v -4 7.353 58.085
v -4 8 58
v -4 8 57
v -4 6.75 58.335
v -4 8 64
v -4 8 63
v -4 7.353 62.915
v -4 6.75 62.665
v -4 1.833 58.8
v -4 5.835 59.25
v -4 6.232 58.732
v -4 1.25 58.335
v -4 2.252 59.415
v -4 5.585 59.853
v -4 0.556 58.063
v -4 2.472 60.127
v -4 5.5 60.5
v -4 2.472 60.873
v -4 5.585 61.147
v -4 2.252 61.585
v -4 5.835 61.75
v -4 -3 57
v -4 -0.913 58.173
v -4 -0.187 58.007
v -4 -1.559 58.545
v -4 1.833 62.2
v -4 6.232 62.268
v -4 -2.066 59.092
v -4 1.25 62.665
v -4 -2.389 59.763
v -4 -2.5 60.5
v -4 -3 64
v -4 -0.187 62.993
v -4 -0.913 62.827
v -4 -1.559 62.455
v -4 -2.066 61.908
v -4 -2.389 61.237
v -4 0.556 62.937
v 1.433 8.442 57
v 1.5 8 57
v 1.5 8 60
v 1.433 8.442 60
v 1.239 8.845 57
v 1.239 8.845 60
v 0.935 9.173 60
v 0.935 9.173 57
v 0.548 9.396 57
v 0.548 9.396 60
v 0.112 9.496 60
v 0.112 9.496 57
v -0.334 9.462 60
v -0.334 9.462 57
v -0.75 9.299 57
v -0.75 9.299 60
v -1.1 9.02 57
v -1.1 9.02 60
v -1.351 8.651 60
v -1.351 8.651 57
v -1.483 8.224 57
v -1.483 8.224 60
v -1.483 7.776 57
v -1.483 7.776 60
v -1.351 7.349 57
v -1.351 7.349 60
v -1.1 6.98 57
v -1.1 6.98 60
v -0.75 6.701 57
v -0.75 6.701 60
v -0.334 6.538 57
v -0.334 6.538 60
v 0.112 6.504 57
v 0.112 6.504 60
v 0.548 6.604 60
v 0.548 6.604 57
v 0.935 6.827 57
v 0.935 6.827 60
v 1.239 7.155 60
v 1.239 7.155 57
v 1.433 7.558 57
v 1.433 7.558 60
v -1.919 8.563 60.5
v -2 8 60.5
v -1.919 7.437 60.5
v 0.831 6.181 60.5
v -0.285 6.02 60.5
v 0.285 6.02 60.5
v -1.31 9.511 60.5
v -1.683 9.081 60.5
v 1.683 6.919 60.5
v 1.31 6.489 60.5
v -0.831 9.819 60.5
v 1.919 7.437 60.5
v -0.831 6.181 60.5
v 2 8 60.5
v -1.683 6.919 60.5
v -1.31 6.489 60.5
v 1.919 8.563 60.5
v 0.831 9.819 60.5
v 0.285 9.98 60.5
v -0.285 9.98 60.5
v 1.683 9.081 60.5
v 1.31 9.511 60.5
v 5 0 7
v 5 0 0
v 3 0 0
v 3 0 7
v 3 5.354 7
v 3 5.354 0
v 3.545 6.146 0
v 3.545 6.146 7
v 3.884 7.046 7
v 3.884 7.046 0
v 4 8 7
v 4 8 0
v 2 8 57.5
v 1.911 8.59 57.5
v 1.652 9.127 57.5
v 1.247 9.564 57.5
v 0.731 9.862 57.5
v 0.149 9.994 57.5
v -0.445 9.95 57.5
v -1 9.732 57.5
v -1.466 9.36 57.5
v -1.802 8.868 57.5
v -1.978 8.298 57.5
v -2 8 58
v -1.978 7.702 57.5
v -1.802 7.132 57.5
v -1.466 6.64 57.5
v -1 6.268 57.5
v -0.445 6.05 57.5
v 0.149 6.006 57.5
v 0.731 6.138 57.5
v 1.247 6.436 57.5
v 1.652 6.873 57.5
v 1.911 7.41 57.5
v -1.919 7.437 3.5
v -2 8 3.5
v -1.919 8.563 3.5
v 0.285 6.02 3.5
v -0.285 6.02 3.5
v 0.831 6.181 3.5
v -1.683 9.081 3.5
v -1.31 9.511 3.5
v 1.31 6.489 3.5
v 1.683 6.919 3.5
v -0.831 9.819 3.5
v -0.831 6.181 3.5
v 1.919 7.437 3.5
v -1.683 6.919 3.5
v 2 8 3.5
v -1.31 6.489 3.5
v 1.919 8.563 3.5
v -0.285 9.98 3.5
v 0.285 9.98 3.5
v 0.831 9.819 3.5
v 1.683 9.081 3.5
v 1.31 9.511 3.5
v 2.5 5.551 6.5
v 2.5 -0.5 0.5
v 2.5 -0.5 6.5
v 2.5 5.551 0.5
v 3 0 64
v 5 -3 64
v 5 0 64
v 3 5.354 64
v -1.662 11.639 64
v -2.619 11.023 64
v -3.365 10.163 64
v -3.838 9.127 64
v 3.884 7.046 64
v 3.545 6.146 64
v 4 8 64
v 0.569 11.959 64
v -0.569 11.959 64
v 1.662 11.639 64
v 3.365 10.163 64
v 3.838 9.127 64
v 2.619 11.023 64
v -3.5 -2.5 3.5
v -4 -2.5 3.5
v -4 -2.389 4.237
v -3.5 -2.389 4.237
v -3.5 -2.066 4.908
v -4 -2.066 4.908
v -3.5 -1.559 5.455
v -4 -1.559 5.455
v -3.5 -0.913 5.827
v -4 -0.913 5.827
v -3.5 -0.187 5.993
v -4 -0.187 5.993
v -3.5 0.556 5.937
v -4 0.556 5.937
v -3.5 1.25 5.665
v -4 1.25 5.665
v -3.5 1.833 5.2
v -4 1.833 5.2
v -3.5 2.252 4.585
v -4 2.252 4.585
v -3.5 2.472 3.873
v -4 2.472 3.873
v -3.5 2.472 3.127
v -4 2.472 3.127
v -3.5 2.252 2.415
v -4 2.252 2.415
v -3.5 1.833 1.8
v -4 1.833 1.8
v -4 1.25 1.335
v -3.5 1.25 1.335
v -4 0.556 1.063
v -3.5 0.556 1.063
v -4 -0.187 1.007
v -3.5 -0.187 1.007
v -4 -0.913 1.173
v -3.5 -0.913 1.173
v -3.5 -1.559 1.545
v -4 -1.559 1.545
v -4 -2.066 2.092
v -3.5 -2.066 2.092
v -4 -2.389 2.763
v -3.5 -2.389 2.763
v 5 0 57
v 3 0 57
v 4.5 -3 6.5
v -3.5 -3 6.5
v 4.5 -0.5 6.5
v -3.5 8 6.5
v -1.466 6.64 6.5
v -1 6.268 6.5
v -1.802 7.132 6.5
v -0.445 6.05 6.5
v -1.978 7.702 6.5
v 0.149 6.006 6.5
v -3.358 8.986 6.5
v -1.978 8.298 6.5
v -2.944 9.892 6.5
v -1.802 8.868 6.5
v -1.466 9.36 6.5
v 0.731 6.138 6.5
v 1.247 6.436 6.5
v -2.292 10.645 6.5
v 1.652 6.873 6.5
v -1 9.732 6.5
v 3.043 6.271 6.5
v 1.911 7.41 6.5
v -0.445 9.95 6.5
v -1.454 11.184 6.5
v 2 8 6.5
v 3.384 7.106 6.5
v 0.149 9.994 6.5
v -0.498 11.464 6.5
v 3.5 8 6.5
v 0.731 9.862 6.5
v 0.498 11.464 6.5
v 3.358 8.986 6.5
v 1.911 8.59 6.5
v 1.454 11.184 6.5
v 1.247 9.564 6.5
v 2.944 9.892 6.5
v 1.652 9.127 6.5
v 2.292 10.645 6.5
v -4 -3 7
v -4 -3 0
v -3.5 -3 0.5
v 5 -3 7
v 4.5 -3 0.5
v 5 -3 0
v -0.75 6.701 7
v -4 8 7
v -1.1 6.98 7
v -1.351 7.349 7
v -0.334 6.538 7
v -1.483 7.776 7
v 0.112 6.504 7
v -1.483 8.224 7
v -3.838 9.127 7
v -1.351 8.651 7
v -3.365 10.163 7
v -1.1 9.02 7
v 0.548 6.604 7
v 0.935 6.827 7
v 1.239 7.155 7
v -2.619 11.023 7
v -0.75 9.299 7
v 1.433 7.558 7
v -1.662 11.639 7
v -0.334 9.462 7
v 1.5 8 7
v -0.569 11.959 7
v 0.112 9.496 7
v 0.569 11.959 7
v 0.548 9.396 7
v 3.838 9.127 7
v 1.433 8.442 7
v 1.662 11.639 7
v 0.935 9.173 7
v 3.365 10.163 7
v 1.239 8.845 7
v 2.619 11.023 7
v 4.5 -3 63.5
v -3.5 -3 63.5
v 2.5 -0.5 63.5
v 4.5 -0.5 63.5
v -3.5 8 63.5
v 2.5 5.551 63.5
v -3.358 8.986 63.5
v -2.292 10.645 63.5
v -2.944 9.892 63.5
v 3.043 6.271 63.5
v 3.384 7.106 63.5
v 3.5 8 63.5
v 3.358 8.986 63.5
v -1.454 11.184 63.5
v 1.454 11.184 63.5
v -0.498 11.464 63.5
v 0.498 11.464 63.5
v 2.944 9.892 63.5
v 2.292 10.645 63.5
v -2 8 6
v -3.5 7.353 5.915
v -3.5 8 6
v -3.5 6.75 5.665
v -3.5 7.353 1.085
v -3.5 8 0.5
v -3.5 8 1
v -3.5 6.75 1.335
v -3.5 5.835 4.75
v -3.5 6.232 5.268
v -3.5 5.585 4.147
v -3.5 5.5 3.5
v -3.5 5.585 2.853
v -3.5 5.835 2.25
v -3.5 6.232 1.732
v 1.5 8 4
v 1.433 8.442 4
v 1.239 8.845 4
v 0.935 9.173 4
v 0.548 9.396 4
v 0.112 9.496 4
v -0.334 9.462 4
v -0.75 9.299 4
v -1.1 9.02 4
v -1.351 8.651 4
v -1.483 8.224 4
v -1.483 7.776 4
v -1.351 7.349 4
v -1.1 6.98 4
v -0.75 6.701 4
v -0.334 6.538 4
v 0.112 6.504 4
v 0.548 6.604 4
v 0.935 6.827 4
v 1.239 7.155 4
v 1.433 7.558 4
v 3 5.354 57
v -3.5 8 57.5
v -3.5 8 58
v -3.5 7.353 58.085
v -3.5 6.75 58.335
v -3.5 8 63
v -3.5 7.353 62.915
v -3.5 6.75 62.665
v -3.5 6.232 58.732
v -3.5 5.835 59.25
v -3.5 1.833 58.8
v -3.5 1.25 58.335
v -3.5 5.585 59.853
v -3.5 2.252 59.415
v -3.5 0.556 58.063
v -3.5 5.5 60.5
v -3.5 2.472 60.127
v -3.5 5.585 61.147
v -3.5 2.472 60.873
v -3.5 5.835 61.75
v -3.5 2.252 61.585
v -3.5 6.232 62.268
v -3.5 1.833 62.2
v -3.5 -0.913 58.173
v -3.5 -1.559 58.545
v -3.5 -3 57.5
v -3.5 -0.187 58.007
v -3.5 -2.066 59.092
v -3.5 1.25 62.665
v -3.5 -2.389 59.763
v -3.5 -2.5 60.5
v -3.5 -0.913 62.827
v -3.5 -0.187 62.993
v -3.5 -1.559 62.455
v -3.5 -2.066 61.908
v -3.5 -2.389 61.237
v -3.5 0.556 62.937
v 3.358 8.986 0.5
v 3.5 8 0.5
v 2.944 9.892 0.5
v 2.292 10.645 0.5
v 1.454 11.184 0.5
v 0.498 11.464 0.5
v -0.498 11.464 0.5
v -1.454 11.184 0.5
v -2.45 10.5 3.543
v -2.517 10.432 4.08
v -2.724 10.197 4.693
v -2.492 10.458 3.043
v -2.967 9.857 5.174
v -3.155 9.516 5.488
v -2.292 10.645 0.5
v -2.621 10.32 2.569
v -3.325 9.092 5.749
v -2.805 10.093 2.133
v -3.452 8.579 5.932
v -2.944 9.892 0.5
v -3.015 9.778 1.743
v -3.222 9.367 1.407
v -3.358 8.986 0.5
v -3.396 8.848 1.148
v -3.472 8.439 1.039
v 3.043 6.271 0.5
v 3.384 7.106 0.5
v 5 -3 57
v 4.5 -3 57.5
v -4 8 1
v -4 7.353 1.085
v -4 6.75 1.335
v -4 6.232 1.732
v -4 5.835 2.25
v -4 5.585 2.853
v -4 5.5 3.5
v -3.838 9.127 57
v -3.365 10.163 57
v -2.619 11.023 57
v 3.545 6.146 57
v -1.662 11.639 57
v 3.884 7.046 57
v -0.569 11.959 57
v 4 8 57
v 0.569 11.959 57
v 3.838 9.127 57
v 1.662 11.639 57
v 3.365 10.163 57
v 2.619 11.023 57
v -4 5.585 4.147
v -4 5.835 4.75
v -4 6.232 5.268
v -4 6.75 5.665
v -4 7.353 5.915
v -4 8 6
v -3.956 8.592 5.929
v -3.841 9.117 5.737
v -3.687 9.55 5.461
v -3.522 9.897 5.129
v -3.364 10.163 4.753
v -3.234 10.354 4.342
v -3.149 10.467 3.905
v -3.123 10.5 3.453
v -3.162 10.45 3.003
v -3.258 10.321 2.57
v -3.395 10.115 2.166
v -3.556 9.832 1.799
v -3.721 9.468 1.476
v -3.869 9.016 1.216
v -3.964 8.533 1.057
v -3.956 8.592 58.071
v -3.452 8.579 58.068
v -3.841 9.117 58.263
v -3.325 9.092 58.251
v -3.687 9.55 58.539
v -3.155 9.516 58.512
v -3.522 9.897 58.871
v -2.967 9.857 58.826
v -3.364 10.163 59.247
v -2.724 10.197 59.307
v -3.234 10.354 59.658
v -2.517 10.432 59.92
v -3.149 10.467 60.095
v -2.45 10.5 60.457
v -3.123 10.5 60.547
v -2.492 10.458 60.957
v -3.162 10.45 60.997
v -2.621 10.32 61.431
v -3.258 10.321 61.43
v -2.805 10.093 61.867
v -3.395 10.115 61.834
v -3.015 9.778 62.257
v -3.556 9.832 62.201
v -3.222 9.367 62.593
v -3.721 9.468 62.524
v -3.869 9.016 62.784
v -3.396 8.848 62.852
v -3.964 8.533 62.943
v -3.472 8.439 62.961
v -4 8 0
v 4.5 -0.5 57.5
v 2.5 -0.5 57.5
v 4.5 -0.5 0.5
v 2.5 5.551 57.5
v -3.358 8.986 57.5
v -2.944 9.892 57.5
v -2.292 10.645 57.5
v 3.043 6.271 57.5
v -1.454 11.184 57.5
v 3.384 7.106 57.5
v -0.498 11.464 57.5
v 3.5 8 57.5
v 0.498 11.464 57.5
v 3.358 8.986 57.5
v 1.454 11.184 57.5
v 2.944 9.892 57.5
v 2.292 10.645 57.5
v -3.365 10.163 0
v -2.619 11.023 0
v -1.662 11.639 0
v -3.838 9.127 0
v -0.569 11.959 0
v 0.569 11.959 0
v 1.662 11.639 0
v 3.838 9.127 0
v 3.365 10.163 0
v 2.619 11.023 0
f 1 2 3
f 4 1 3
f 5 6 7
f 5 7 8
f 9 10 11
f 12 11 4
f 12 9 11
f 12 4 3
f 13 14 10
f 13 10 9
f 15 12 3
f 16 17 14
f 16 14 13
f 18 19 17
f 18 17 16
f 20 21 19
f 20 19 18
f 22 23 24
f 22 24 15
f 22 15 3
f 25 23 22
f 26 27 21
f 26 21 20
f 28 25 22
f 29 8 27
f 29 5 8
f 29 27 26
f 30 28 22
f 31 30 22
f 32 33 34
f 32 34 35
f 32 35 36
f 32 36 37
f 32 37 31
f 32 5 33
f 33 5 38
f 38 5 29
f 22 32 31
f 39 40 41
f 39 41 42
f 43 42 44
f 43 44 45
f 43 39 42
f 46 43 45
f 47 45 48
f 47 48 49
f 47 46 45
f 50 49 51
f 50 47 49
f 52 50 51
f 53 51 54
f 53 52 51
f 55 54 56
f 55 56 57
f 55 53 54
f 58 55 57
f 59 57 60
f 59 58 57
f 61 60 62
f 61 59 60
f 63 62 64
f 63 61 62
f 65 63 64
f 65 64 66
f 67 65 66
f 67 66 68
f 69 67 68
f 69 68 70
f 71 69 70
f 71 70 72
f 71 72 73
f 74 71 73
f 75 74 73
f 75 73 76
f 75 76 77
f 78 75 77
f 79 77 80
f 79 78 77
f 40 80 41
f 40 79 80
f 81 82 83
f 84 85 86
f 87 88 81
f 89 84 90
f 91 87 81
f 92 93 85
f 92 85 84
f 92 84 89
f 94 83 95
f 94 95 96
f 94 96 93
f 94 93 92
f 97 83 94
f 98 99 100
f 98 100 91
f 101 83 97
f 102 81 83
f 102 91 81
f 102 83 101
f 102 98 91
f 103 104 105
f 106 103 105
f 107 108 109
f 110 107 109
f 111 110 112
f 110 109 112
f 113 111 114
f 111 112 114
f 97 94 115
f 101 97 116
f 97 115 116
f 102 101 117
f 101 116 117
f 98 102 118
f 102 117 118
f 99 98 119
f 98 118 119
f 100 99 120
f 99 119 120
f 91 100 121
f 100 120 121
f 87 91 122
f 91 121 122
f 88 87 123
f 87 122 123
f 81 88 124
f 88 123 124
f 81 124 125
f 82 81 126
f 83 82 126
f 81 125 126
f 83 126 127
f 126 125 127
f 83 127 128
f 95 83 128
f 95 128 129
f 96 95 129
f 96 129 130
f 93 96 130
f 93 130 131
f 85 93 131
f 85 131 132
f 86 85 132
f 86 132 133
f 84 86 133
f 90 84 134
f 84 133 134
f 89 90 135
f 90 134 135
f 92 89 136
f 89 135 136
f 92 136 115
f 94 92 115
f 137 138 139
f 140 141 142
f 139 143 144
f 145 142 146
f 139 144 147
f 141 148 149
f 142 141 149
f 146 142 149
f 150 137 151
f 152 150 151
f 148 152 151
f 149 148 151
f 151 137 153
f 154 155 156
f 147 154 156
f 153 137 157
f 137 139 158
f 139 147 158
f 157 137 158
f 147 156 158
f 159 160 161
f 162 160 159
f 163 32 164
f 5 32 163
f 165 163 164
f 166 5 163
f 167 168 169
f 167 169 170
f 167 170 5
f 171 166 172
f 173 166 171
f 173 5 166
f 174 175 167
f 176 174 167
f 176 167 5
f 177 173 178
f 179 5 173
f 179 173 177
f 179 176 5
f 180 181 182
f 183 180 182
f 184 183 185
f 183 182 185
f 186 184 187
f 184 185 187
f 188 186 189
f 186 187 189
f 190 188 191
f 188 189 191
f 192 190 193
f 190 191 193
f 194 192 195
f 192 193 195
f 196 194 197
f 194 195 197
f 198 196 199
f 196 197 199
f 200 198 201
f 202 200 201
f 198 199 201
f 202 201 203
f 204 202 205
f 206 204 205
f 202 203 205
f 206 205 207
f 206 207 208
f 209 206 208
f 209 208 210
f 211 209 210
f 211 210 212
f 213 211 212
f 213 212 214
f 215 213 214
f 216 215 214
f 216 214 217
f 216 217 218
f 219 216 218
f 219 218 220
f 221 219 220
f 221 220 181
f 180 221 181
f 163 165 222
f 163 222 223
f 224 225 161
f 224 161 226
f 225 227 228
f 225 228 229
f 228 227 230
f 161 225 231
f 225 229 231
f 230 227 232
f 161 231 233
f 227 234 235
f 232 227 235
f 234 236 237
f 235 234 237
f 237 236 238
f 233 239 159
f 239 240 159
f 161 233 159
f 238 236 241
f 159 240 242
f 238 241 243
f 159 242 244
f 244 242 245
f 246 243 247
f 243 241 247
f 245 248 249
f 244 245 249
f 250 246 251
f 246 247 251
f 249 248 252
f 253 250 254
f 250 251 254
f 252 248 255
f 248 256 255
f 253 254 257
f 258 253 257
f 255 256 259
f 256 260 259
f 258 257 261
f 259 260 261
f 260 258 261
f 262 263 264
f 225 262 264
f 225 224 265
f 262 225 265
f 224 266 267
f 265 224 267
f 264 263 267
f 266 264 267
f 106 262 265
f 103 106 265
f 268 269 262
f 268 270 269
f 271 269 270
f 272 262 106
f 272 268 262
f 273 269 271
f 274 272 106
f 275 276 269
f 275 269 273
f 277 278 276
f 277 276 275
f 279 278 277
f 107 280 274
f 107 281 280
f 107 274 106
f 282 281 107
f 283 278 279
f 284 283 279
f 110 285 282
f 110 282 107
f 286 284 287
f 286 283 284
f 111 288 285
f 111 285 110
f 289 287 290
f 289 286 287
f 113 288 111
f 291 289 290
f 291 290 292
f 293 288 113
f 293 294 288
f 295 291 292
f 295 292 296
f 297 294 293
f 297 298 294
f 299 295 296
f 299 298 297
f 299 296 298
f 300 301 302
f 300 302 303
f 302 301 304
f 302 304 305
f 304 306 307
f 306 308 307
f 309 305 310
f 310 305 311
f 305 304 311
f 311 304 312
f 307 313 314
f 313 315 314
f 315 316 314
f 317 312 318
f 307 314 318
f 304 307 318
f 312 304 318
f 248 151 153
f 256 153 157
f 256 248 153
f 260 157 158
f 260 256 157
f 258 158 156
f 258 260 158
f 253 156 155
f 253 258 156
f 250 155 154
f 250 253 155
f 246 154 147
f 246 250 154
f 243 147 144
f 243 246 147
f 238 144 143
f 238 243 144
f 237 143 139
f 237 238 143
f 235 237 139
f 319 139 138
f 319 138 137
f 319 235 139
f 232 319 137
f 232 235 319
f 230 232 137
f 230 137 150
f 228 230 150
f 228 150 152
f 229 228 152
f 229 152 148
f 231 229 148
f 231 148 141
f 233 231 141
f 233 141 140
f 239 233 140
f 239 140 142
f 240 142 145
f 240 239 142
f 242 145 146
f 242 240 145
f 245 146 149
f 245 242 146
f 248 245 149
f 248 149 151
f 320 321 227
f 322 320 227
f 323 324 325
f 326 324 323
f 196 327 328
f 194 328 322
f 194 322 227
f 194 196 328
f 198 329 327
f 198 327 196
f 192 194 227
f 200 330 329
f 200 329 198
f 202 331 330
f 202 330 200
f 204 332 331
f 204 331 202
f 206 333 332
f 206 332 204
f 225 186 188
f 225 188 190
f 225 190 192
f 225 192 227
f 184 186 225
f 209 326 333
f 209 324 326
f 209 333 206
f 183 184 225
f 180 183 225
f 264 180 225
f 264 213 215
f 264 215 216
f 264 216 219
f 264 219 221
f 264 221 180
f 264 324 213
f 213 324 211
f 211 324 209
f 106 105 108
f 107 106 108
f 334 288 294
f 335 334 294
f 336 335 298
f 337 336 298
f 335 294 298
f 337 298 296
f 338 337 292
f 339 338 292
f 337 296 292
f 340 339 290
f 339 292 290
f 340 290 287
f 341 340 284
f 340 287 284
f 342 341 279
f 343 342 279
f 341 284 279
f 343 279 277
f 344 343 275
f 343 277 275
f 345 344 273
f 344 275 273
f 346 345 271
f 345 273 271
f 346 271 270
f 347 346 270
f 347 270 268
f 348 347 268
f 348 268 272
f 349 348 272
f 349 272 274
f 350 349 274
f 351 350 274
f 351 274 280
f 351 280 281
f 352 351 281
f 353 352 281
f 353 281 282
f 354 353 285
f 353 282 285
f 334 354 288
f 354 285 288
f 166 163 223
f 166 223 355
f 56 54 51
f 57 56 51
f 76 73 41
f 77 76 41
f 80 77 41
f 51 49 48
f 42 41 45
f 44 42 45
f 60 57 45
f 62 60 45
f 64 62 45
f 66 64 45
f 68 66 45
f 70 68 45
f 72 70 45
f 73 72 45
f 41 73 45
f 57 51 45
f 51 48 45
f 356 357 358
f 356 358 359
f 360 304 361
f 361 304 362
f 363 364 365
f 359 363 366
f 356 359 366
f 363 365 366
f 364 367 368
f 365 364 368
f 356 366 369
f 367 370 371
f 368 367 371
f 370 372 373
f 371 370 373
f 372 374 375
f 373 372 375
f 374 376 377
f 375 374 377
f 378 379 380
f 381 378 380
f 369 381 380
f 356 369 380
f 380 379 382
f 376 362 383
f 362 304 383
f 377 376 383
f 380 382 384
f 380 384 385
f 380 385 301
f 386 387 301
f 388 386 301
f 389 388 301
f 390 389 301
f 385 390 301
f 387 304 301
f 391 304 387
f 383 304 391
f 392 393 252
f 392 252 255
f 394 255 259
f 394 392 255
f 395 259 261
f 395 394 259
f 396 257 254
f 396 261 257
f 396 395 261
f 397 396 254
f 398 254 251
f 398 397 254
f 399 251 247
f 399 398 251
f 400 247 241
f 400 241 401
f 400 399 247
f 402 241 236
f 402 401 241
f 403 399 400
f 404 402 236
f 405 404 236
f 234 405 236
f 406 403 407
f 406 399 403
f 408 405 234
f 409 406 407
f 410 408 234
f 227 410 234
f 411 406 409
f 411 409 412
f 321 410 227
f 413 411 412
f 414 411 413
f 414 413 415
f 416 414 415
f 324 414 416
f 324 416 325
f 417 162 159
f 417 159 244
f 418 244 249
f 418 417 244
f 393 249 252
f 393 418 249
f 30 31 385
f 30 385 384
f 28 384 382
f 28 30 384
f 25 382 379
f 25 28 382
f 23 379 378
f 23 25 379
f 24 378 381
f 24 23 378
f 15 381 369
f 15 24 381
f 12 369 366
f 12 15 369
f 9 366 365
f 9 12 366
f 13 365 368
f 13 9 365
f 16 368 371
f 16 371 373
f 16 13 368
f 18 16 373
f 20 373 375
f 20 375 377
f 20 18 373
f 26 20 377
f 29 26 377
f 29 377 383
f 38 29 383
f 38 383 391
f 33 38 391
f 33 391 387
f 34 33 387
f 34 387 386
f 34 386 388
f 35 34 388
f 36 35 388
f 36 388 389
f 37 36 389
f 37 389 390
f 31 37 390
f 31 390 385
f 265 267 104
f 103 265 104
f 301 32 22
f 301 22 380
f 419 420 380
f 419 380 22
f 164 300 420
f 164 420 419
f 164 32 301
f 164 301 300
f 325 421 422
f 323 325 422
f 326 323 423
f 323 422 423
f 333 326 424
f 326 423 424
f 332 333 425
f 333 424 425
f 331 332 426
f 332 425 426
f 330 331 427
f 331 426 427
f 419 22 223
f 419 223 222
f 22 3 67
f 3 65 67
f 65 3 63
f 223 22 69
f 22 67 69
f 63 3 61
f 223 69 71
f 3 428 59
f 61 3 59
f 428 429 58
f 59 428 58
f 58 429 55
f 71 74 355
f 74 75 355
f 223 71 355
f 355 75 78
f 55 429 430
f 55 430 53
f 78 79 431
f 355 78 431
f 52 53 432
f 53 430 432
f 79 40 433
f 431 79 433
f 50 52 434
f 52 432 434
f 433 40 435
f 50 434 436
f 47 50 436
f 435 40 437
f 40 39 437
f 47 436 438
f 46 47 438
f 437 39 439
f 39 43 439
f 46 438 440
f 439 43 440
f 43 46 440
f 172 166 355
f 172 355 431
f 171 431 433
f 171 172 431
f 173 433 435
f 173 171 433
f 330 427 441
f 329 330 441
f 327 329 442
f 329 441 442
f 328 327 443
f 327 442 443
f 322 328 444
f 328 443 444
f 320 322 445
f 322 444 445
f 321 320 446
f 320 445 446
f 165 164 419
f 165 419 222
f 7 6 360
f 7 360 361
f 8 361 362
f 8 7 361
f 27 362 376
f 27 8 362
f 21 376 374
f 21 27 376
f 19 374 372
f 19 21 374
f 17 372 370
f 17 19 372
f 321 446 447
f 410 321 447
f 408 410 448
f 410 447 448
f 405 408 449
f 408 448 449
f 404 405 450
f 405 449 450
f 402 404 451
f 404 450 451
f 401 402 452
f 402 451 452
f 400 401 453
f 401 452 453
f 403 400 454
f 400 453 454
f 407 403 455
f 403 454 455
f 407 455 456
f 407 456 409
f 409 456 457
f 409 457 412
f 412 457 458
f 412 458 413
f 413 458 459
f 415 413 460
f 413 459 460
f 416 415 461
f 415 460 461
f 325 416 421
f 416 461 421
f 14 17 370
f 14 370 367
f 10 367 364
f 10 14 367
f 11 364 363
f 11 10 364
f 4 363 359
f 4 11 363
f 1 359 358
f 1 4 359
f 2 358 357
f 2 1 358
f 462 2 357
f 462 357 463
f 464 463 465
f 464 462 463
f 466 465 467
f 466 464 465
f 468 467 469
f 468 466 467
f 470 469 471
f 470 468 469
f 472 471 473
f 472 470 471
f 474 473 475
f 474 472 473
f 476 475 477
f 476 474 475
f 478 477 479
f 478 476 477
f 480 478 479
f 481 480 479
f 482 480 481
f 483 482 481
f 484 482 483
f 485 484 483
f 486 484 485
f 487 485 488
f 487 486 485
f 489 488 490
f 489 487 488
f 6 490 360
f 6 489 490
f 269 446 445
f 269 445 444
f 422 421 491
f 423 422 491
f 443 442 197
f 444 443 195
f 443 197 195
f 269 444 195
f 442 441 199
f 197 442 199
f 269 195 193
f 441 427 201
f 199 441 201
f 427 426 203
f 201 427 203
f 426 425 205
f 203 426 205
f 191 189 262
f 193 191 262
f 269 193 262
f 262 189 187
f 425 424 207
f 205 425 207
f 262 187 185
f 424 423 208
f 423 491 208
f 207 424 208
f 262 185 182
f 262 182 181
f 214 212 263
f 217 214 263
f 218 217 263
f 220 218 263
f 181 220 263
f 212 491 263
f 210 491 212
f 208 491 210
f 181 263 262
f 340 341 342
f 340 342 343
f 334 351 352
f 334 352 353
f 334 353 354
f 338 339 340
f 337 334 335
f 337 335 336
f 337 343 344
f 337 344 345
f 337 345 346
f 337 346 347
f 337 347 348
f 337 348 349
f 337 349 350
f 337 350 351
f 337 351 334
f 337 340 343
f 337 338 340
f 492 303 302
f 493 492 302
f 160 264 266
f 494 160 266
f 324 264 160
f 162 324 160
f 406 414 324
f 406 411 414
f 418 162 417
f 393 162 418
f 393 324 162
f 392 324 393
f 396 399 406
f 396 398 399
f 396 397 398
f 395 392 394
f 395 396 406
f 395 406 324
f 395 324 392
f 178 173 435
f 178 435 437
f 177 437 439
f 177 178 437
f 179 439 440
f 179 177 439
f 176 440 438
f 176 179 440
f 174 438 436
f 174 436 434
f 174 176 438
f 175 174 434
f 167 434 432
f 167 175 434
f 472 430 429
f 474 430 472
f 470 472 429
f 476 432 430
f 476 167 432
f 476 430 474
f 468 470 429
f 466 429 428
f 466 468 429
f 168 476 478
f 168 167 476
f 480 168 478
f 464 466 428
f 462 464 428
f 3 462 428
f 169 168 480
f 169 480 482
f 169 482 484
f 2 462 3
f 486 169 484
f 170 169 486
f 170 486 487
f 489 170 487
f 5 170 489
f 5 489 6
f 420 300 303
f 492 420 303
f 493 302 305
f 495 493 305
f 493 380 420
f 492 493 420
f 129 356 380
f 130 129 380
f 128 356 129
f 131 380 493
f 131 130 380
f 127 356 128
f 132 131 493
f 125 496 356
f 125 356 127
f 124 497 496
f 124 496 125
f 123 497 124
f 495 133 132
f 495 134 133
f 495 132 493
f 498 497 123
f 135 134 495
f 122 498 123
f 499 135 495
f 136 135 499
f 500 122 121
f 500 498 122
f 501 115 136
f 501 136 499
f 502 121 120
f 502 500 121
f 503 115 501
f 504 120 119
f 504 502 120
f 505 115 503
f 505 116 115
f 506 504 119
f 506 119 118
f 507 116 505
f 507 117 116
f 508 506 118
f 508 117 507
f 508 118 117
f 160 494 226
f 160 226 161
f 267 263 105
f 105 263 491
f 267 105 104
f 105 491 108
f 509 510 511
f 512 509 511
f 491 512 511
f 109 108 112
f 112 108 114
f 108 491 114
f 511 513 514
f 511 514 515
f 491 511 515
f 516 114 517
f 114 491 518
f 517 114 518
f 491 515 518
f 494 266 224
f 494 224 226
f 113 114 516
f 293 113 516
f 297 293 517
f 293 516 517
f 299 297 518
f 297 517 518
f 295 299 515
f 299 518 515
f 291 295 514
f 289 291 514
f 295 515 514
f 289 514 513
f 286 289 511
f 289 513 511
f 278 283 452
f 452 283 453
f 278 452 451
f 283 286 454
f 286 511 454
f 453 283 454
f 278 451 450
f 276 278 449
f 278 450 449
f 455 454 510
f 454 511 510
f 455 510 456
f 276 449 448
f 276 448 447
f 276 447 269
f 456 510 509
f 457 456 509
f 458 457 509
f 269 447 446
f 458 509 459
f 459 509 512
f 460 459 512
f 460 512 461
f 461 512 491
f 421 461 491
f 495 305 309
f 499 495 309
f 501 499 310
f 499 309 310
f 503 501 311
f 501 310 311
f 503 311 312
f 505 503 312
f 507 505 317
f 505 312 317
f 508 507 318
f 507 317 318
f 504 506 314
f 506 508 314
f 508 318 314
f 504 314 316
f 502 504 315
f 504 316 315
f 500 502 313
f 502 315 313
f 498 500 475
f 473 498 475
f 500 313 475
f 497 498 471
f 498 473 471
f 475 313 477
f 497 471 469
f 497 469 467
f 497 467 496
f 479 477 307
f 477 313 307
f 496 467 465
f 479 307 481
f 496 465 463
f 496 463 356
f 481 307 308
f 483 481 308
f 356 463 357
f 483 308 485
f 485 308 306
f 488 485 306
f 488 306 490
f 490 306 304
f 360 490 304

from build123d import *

# Parameters (mm, degrees)
F1_DEPTH = 7
F2_R     = 1.5
F3_DEPTH = 3
F4_T     = -0.5
F5_R     = 2.5
F6_DEPTH = 2


with BuildPart() as f1:
    # F0 (on Top) → F1 (new body)
    with BuildSketch(Plane.XY):
        with BuildLine():
            ThreePointArc((3, 5.3542486889), (-1.4142135624, 4.2583426132), (-4, 8))
            Line((-4, 8), (-4, -3))
            Line((-4, -3), (5, -3))
            Line((5, -3), (5, 0))
            Line((5, 0), (3, 0))
            Line((3, 0), (3, 5.3542486889))
        make_face()
        with BuildLine():
            ThreePointArc((4, 8), (0, 12), (-4, 8))
            ThreePointArc((-4, 8), (-1.4142135624, 4.2583426132), (3, 5.3542486889))
            ThreePointArc((3, 5.3542486889), (3.7416573868, 6.5857864376), (4, 8))
        make_face()
    extrude(amount=F1_DEPTH)

    # F2 (on face) → F3 (cut)
    with BuildSketch(Plane.XY.offset(7)):
        with Locations((0, 8)):
            Circle(F2_R)
    extrude(amount=-F3_DEPTH, mode=Mode.SUBTRACT)

    # F4
    f4_openings = [f1.faces().sort_by_distance(p)[0] for p in [
        (0.5, -3, 3.5),
    ]]
    offset(amount=F4_T, openings=f4_openings, kind=Kind.INTERSECTION)

    # F5 (on face) → F6 (cut)
    with BuildSketch(Plane(origin=(-4, 0, 0), x_dir=(0, -1, 0), z_dir=(-1, 0, 0))):
        with BuildLine():
            ThreePointArc((-8, 1), (-6.232233047, 1.732233047), (-5.5, 3.5))
            ThreePointArc((-5.5, 3.5), (-6.232233047, 5.267766953), (-8, 6))
            Line((-8, 6), (-8, 1))
        make_face()
        with Locations((0, 3.5)):
            Circle(F5_R)
        with BuildLine():
            Line((-8, 1), (-8, 6))
            ThreePointArc((-8, 6), (-10.5, 3.5), (-8, 1))
        make_face()
    extrude(amount=-F6_DEPTH, mode=Mode.SUBTRACT)


with BuildPart() as f8_1:
    # F8: instance of F1
    add(f1.part.mirror(Plane(origin=(-0.0809369199, 3.7263048418, 32), x_dir=(1, 0, 0), z_dir=(0, 0, 1))))


solid = Compound([f1.part, f8_1.part])
